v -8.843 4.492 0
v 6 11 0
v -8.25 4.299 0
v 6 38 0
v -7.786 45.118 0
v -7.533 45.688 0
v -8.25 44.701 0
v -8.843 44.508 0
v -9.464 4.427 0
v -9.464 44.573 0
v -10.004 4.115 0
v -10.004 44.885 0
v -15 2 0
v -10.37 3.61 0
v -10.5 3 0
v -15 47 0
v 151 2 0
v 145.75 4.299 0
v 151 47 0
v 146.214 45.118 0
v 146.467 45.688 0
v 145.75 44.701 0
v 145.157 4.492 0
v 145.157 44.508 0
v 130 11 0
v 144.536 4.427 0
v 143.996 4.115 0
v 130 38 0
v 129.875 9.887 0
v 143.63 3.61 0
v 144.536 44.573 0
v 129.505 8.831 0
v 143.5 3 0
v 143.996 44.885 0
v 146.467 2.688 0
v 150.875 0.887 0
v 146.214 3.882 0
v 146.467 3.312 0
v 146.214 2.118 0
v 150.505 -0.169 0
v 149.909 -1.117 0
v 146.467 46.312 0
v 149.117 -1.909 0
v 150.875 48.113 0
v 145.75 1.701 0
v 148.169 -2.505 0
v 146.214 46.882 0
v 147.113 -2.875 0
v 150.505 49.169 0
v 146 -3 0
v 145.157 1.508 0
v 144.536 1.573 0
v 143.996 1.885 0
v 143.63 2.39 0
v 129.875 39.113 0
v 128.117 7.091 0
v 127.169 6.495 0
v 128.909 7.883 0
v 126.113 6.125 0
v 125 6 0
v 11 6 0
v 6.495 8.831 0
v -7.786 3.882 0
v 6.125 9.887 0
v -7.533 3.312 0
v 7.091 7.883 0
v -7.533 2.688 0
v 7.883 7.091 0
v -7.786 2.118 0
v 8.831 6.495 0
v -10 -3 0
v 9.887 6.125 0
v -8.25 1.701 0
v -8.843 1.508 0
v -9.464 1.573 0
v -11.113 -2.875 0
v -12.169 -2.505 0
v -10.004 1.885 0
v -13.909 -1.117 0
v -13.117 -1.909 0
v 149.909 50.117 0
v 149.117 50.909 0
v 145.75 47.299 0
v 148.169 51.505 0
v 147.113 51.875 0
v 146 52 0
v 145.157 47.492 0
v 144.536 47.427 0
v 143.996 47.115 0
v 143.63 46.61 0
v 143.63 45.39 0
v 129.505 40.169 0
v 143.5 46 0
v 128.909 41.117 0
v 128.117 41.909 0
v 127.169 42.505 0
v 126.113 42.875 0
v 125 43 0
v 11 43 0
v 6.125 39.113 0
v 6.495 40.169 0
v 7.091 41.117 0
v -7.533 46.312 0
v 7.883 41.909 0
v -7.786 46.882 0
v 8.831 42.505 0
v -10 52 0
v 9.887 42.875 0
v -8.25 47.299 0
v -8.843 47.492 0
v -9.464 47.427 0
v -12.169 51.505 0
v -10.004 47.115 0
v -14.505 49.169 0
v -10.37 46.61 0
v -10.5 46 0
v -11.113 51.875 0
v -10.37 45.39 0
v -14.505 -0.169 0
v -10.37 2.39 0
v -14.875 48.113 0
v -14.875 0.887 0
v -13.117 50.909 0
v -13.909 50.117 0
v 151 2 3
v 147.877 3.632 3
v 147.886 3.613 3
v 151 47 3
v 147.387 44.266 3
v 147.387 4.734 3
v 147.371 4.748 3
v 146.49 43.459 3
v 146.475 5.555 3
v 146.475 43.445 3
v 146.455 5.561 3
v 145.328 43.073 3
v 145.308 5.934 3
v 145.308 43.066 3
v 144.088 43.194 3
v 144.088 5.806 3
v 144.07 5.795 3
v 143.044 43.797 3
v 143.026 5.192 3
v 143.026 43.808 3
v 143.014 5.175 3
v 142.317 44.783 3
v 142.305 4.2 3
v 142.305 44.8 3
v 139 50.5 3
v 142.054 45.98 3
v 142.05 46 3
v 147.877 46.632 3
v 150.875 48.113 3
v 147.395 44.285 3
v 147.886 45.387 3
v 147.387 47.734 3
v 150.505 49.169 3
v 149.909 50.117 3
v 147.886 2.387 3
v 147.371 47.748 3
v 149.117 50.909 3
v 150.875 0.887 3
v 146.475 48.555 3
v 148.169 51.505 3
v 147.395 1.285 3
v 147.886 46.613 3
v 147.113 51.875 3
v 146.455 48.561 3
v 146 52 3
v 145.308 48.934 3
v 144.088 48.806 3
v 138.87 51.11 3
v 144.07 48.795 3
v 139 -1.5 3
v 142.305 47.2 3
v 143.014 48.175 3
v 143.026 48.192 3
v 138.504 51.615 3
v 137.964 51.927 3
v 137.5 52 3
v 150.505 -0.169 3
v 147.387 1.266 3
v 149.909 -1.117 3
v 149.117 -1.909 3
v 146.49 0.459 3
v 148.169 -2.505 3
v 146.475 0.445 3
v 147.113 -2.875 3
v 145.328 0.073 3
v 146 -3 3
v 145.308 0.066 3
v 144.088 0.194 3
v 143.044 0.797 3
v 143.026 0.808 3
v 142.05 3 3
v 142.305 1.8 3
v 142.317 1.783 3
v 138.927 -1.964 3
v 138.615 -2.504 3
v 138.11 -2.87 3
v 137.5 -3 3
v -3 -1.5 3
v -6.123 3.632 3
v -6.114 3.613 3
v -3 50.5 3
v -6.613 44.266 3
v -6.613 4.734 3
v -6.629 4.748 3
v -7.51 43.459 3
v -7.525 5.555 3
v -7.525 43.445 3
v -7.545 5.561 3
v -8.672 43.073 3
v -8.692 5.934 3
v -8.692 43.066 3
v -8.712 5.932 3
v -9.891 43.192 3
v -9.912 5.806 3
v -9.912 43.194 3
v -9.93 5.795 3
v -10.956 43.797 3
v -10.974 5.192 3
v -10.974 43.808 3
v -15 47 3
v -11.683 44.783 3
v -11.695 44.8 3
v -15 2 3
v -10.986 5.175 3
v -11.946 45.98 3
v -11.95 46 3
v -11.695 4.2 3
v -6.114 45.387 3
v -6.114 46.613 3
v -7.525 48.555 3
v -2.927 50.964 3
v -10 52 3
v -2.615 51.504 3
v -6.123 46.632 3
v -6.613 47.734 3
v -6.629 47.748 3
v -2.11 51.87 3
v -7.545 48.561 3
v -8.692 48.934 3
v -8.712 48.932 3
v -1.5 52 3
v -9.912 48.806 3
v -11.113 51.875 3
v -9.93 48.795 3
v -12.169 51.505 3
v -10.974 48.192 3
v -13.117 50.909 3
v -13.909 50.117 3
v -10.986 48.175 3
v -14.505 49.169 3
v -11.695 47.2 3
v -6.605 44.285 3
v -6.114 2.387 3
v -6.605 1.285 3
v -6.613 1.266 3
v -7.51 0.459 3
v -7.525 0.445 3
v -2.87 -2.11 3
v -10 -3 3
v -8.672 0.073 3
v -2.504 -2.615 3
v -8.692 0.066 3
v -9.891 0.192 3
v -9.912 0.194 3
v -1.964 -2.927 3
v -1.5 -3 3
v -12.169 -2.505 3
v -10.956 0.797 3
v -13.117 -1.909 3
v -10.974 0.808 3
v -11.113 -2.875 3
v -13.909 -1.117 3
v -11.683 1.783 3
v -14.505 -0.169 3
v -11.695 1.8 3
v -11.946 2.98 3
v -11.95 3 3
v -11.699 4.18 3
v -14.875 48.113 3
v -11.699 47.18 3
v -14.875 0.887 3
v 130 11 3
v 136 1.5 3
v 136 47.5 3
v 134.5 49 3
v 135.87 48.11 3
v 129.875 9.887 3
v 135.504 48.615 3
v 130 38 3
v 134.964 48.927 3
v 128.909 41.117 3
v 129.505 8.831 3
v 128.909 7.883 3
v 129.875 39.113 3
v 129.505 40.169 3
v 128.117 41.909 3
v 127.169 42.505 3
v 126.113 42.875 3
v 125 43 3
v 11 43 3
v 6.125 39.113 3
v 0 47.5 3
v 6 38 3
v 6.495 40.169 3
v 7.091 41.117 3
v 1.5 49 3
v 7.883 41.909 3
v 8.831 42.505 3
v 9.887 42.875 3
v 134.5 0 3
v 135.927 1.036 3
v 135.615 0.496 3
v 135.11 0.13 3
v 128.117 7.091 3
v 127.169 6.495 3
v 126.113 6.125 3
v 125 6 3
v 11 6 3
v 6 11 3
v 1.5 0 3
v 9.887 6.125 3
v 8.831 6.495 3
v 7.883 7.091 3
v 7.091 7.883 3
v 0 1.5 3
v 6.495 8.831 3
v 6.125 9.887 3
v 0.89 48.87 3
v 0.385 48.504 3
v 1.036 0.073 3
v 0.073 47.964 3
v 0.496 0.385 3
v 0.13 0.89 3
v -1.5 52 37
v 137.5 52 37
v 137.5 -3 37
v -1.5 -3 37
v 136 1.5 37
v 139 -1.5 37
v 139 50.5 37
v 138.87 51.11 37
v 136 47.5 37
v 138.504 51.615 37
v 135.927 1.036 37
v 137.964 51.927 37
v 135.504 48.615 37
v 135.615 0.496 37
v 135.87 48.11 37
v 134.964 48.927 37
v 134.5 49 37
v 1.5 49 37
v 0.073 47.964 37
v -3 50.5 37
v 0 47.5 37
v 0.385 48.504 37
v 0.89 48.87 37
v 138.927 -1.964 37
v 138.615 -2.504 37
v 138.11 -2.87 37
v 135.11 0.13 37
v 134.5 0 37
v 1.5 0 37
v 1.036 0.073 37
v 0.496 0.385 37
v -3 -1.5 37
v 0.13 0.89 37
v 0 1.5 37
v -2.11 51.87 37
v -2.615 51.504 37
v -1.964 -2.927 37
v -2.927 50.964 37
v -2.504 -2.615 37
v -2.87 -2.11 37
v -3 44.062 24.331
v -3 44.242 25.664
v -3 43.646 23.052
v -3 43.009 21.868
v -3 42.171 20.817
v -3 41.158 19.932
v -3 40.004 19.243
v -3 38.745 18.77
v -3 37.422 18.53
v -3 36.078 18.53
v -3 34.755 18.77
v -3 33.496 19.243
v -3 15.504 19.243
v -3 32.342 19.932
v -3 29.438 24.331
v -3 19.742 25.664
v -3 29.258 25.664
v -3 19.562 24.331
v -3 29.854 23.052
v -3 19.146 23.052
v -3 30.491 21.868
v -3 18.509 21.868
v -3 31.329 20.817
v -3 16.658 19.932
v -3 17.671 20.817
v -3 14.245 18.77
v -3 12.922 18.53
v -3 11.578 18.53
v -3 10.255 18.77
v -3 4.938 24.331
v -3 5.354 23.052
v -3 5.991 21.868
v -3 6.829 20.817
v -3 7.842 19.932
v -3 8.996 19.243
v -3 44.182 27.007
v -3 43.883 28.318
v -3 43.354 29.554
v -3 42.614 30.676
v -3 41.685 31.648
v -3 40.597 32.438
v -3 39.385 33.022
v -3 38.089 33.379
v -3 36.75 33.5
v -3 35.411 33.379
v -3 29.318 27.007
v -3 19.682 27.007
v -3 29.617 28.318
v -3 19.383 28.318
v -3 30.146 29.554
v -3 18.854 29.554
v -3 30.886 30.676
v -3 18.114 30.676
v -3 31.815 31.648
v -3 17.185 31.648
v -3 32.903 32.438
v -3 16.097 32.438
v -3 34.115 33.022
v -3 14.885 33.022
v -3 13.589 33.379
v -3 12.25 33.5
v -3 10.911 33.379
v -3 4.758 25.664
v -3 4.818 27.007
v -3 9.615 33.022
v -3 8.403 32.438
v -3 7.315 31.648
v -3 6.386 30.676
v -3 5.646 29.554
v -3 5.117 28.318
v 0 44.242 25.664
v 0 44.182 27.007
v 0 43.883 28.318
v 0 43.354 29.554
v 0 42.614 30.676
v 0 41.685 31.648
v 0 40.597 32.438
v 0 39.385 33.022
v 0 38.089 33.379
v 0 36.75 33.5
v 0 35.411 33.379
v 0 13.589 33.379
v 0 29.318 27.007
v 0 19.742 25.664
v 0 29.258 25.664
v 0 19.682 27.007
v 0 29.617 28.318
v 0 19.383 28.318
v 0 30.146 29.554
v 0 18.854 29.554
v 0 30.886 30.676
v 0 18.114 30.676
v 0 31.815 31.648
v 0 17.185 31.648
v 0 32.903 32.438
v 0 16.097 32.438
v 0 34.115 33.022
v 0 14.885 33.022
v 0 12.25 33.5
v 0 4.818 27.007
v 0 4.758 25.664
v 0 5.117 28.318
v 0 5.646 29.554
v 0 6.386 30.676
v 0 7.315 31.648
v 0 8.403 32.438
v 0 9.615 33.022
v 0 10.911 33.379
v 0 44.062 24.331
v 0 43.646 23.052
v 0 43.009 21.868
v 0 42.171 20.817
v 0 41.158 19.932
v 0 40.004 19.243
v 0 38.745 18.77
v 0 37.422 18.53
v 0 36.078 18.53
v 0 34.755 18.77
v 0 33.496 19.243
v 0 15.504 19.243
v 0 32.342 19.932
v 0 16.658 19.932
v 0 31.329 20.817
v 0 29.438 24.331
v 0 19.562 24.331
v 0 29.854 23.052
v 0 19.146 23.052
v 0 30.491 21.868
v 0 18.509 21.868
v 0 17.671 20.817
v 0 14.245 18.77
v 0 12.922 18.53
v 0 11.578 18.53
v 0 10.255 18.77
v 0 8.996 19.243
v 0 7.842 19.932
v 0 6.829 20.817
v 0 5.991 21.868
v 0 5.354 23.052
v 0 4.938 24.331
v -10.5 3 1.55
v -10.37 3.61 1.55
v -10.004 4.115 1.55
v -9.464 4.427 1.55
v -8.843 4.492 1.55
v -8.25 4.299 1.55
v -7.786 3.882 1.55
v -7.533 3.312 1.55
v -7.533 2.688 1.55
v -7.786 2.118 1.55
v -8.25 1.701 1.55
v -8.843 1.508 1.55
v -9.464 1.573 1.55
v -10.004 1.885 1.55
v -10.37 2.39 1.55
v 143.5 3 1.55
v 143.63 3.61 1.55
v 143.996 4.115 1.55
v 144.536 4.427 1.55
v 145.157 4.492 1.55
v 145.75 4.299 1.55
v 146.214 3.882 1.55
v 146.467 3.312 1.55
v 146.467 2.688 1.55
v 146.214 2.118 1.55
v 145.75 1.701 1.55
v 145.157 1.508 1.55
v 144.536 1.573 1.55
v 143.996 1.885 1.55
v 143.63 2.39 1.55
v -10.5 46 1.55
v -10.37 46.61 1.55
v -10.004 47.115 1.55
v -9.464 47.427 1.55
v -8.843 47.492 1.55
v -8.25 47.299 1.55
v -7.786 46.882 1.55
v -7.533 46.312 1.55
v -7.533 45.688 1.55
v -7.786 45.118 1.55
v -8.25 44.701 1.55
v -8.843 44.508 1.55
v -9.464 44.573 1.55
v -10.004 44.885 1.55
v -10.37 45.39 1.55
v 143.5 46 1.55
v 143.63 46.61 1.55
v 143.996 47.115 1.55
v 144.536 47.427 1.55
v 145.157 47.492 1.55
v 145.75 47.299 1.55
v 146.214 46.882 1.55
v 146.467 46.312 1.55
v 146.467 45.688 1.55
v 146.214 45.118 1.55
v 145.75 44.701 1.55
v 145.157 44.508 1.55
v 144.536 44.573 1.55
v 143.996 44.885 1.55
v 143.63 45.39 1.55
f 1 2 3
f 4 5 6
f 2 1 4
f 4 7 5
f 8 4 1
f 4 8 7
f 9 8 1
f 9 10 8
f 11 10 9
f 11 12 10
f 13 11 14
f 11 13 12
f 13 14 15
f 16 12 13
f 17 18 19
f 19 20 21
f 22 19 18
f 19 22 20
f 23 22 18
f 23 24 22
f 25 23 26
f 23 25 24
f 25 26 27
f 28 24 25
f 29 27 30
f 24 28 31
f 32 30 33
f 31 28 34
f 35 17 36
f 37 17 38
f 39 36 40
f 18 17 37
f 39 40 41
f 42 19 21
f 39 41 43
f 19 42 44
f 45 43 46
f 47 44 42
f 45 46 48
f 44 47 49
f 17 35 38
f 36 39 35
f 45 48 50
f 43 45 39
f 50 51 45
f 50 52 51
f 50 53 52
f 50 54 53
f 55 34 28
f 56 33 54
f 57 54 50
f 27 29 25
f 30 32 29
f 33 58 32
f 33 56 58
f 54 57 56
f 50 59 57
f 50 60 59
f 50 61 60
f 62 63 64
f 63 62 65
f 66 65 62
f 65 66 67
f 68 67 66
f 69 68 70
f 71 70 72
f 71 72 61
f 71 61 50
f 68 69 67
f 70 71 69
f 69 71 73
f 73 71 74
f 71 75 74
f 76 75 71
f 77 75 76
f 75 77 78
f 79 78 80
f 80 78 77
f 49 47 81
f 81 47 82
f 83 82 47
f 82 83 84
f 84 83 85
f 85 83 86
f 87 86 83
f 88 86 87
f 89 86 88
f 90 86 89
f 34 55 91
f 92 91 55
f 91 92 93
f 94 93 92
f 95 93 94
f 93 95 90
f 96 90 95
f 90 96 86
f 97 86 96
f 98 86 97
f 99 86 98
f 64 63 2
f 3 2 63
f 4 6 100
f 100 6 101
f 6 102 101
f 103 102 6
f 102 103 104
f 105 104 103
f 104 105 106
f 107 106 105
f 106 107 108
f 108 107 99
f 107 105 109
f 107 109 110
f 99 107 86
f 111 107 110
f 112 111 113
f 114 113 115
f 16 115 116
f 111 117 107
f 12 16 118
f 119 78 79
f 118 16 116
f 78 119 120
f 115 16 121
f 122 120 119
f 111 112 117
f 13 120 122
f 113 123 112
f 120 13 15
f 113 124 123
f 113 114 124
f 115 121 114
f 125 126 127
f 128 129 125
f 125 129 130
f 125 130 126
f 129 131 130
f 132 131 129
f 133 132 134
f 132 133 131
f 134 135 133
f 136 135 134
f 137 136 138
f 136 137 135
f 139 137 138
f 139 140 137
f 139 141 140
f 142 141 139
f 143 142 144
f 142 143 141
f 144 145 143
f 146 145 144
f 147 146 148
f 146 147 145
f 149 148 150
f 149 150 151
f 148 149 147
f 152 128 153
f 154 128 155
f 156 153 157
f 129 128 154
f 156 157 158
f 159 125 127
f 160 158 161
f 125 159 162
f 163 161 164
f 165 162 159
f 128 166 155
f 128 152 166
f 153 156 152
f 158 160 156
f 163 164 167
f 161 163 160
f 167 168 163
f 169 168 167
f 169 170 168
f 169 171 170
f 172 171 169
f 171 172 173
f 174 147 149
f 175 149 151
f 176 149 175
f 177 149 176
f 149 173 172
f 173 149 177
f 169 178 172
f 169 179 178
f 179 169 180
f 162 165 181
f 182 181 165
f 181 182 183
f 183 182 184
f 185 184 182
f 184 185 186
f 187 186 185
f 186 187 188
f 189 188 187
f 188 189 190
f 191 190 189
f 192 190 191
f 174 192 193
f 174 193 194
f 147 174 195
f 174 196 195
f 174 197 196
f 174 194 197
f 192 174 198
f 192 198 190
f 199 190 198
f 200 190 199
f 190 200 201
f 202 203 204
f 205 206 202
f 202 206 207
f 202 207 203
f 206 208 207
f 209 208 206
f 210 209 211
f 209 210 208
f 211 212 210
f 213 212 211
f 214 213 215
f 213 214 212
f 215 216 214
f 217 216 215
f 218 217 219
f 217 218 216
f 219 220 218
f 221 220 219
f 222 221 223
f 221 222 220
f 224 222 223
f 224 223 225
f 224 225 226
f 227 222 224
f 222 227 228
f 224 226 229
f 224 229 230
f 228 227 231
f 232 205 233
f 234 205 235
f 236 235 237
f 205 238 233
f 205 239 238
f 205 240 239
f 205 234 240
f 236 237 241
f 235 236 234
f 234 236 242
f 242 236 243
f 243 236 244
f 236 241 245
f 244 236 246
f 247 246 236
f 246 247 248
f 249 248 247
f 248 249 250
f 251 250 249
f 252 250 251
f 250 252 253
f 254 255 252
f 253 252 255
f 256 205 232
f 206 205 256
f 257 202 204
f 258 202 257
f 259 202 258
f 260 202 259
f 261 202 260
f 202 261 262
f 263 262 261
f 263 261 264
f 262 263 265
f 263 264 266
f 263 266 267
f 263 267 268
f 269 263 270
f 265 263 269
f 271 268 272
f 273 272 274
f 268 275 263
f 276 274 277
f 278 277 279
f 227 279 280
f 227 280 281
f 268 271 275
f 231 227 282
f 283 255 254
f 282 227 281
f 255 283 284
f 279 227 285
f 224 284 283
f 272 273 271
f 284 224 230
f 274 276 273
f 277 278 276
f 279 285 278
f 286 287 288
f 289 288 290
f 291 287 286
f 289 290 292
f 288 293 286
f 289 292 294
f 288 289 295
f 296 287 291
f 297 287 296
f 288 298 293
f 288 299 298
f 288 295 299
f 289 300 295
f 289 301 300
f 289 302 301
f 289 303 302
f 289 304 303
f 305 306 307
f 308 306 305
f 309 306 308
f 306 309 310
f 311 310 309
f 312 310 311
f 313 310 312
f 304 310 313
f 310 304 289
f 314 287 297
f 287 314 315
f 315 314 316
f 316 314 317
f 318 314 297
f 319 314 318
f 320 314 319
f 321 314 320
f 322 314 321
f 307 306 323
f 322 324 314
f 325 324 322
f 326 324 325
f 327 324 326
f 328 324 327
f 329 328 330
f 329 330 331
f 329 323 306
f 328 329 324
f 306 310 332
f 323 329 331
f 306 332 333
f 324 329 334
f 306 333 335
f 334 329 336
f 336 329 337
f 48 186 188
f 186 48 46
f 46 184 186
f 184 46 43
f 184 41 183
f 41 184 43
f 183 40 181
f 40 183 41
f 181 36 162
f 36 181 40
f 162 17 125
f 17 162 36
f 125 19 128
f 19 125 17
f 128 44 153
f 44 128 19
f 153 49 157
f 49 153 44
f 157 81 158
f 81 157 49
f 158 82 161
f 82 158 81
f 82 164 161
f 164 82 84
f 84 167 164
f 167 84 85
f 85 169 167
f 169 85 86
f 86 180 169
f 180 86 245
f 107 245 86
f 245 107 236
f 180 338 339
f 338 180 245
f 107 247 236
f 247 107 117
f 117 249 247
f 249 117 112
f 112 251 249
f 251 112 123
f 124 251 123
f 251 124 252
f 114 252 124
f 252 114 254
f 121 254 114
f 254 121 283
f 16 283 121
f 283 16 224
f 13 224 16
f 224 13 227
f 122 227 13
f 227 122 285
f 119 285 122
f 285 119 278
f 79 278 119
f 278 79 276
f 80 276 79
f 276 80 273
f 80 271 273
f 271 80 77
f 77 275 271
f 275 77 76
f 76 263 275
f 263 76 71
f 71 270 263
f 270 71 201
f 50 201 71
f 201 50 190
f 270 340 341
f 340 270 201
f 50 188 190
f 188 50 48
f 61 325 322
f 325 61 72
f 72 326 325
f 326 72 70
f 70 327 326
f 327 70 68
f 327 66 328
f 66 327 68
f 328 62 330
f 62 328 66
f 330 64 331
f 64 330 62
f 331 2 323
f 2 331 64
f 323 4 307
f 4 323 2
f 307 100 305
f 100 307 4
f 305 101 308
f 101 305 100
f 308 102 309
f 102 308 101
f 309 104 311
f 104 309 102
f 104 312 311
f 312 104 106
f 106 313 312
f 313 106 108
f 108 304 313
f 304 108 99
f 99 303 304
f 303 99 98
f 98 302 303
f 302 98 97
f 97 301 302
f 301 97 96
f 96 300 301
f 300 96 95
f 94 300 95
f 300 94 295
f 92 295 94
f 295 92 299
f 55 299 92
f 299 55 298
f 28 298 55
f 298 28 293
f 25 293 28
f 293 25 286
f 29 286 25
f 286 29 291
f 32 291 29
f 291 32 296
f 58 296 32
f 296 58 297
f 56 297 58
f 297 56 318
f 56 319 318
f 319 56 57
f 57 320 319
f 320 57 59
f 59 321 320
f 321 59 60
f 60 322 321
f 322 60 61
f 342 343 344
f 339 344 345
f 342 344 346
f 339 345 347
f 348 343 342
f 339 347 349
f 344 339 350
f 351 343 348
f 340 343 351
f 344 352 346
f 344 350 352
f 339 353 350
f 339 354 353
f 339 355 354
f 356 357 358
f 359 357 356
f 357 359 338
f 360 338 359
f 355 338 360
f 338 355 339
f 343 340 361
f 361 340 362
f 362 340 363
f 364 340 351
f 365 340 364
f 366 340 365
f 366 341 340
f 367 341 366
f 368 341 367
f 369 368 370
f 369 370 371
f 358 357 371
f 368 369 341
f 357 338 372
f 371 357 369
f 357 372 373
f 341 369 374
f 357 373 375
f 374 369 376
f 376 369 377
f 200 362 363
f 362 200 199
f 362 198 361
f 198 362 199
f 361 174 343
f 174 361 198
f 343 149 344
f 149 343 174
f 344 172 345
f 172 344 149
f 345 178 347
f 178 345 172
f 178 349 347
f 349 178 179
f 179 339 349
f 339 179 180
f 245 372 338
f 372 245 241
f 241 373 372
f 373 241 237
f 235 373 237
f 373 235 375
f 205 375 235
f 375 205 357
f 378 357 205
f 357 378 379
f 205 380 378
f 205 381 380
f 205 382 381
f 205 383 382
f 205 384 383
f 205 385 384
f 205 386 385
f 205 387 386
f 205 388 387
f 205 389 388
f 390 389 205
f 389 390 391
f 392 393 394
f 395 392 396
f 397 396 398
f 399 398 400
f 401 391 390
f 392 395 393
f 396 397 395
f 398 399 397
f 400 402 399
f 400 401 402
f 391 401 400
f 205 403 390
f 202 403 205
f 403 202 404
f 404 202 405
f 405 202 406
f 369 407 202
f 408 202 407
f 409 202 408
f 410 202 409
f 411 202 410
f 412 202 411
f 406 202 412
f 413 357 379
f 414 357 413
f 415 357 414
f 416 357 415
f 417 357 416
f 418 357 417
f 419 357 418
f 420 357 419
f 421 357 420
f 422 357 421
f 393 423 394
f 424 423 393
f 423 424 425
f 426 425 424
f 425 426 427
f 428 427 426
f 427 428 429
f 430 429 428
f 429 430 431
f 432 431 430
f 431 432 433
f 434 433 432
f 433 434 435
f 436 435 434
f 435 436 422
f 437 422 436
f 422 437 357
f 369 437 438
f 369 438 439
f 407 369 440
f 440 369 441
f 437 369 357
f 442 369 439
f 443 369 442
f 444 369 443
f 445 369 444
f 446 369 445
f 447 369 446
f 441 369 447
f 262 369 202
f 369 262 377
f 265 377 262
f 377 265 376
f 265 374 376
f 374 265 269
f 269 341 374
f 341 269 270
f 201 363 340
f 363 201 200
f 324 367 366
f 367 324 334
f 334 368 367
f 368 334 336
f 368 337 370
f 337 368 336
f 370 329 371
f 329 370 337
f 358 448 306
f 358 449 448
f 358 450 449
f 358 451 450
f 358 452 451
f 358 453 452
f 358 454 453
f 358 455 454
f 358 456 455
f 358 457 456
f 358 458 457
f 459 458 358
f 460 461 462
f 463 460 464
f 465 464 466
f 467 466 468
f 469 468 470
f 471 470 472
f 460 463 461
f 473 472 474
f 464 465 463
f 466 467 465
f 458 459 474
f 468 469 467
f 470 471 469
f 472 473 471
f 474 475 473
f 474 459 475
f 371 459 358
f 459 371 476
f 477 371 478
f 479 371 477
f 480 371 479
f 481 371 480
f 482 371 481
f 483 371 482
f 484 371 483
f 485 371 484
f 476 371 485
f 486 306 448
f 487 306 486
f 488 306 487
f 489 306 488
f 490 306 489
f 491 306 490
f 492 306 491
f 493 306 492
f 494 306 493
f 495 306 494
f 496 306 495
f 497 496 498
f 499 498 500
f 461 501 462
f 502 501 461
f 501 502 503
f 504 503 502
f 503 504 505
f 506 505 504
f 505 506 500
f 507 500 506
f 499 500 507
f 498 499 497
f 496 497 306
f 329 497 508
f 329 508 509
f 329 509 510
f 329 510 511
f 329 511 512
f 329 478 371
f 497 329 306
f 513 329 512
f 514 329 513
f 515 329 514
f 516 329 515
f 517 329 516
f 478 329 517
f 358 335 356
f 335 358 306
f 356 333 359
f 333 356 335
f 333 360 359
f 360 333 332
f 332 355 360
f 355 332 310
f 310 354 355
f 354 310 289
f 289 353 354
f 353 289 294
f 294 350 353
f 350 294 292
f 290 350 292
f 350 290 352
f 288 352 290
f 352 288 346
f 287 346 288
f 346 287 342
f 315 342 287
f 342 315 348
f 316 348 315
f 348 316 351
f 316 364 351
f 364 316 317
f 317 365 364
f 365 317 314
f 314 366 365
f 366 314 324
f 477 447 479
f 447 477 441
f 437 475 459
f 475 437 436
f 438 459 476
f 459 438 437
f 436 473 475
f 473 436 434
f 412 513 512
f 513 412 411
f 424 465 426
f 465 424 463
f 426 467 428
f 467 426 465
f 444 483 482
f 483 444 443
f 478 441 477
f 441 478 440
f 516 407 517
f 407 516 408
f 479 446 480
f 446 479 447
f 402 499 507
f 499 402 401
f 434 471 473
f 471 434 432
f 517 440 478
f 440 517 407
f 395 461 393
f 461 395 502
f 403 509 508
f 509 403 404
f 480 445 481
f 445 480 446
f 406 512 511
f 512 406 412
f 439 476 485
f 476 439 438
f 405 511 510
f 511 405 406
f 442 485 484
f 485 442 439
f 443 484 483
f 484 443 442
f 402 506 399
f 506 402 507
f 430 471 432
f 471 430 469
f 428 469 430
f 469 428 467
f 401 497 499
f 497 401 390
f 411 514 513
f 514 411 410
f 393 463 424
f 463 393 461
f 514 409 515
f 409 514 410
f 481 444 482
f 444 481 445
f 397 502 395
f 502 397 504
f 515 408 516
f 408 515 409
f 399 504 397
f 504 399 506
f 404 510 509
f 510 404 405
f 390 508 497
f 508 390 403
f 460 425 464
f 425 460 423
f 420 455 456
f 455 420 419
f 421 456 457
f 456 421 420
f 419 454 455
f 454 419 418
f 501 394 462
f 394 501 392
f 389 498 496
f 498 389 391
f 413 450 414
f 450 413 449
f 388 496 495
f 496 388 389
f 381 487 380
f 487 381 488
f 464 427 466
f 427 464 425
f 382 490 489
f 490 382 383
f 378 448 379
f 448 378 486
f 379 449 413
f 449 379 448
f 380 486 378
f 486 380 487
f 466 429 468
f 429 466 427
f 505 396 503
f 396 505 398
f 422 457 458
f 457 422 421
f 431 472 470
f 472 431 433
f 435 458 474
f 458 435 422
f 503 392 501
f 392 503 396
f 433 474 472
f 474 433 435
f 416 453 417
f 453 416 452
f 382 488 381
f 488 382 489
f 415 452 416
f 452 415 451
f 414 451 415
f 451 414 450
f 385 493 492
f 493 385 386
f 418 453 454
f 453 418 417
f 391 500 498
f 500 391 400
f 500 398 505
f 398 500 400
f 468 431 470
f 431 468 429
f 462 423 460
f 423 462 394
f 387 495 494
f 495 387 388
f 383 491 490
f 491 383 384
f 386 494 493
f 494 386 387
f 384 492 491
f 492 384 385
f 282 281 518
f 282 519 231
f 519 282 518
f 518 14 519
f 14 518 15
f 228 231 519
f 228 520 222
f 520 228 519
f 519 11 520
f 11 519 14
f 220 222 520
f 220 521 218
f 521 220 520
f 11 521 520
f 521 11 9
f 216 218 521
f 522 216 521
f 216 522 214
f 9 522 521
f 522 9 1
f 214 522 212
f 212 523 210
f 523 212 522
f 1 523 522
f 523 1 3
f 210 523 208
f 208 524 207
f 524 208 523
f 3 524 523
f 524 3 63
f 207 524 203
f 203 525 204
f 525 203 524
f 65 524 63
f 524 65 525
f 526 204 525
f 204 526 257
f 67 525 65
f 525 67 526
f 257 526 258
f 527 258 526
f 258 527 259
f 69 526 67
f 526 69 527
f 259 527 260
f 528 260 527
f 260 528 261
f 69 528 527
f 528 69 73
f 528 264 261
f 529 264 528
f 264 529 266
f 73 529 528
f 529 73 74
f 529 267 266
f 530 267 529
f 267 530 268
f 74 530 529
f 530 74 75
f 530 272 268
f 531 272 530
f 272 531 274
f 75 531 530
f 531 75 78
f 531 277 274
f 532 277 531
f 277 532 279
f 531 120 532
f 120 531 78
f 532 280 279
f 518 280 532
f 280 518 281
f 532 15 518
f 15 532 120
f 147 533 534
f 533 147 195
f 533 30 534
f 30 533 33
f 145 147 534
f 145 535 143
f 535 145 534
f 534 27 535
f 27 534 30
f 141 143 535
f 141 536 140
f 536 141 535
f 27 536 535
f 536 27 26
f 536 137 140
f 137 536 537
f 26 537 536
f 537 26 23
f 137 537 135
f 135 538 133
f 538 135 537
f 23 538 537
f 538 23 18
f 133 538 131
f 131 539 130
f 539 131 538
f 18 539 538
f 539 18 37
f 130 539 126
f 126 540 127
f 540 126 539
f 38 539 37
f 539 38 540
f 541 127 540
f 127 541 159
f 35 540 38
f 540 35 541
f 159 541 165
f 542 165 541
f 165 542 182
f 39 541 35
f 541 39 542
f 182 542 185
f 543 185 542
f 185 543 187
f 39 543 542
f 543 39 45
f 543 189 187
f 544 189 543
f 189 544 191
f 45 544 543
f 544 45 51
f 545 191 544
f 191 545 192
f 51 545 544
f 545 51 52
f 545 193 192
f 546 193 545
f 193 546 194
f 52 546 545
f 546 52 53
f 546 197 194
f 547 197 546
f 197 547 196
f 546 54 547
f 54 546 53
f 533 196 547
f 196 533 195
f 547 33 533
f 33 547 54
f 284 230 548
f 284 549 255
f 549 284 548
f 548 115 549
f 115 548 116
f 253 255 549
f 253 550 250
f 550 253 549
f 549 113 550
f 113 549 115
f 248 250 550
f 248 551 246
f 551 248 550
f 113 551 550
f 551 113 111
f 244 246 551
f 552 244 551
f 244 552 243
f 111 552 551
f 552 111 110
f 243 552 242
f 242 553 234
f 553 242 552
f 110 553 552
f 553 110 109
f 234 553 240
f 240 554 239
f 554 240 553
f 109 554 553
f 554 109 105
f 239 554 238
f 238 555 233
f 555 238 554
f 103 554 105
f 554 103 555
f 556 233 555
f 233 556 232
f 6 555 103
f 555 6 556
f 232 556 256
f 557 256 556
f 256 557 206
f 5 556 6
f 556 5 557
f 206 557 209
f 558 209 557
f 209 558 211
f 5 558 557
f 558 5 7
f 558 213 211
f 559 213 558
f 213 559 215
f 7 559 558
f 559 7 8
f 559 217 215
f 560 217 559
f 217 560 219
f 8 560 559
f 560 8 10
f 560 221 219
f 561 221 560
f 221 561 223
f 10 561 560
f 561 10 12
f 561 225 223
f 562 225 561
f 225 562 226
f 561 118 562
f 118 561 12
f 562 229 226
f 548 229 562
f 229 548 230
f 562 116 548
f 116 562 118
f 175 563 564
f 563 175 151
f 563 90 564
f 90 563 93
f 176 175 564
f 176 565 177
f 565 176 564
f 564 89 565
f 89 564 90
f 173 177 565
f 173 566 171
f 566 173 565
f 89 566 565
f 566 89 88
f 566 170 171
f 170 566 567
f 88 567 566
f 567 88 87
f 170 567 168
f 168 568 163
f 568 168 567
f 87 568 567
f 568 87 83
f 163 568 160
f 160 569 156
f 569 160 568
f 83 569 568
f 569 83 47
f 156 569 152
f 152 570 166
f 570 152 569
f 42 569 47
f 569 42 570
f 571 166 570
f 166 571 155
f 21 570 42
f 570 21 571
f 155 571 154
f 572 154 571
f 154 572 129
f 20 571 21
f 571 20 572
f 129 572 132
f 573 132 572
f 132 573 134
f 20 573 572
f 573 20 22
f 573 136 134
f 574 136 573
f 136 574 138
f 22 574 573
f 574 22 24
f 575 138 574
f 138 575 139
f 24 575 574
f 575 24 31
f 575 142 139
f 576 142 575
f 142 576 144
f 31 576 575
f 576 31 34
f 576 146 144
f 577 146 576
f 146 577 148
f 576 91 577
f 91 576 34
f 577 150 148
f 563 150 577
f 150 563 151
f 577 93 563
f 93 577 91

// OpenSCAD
//------------------------------------------------------------------
/*

Battery Holder

2 x 3000 mAh 7.2V battery backs
See- http://www.tenergy.com, Item #11204-01

*/
//------------------------------------------------------------------

// measurements taken from batteries
box_h = 34;
box_w = 49; // 2 batteries side by side
box_l = 136; // slightly longer to allow diagonal insertion
connector_d = 15; // hole for tamiya connector pass-thru
connector_z = 23; // z position of connector hole

// preferences
wall_t = 3; // wall thickness
wall_r = 1.5; // wall corner rounding
foot_inset = 6; // foot inset
foot_r = 5; // foot rounding
foot_h = 3; // foot height
foot_l = 12; // foot length
foot_hole_d = 3; // hole diameter for mounting foot
hole_to_edge = 6;

//------------------------------------------------------------------

// small tweak to avoid differencing artifacts
epsilon = 0.05;

// control the number of facets on cylinders
facet_epsilon = 0.03;
function facets(r) = 180 / acos(1 - (facet_epsilon / r));

// rounded polygons
module rounded(r=1) {
  offset(r=r, $fn=facets(r)) offset(r=-r, $fn=facets(r)) children(0);
}

// filleted polygons
module filleted(r=1) {
  offset(r=-r, $fn=facets(r)) render() offset(r=r, $fn=facets(r)) children(0);
}

//------------------------------------------------------------------

module wall_2d(t) {
  wall = 2 * t;
  p = [
    [0,0],
    [box_l + wall,0],
    [box_l + wall,box_w + wall],
    [0,box_w + wall],
  ];
  polygon(points=p);
}

module wall() {
  linear_extrude(height=box_h + epsilon, convexity = 2) difference() {
    translate([-wall_t, -wall_t]) rounded(wall_r) wall_2d(wall_t);
    rounded(wall_r) wall_2d(0);
  }
}

//------------------------------------------------------------------

module foot_2d() {
  x = 2 * (wall_t + foot_l);
  y = 2 * wall_t;
  p = [
    [0,0],
    [box_l + x,0],
    [box_l + x, box_w + y],
    [0,box_w + y],
  ];
  polygon(points=p);
}

module foot() {
  linear_extrude(height=foot_h) difference() {
    translate([-foot_l - wall_t, -wall_t]) rounded(foot_r) foot_2d();
    translate([foot_inset, foot_inset]) rounded(foot_r) wall_2d(-foot_inset);
  }
}

//------------------------------------------------------------------

module connector_hole() {
  h = wall_t + (2 * epsilon);
  r = connector_d / 2;
  cylinder(h=h, r=r, $fn=facets(r));
}

module connector_holes() {
  d = box_w / 2;
  yofs = d / 2;
  zofs = foot_h + connector_z;
  translate([epsilon,0,zofs]) rotate([0,-90,0]) translate([0,yofs,0]) {
    connector_hole();
    translate([0,d,0]) connector_hole();
  }
}

//------------------------------------------------------------------

module hole_countersunk(
  length,
  radius,
) {
  l = length;
  r = radius;
  if (r > l) {
    points = [
      [0, 0],
      [(2 * r) - l, 0],
      [2 * r, l],
      [0, l]
    ];
    rotate_extrude($fn=facets(r)) polygon(points=points);
  } else {
    points = [
      [0, 0],
      [r, 0],
      [r, l - r],
      [2 * r, l],
      [0, l]
    ];
    rotate_extrude($fn=facets(r)) polygon(points=points);
  }
}

module foot_holes() {
  l = foot_h + (2 * epsilon);
  r = foot_hole_d / 2;
  x = box_l + 2 * (wall_t + foot_l - hole_to_edge);
  y = box_w + 2 * (wall_t - hole_to_edge);
  xofs = foot_l - hole_to_edge + wall_t;
  yofs = hole_to_edge - wall_t;
  translate([-xofs, yofs,-epsilon]) {
    translate([0,0]) hole_countersunk(l,r);
    translate([x,0]) hole_countersunk(l,r);
    translate([0,y]) hole_countersunk(l,r);
    translate([x,y]) hole_countersunk(l,r);
  }
}

//------------------------------------------------------------------

module holder() {
  difference() {
    union() {
      foot();
      translate([0,0,foot_h - epsilon]) wall();
    }
    union() {
      connector_holes();
      foot_holes();
    }
  }
}

holder();

//------------------------------------------------------------------
